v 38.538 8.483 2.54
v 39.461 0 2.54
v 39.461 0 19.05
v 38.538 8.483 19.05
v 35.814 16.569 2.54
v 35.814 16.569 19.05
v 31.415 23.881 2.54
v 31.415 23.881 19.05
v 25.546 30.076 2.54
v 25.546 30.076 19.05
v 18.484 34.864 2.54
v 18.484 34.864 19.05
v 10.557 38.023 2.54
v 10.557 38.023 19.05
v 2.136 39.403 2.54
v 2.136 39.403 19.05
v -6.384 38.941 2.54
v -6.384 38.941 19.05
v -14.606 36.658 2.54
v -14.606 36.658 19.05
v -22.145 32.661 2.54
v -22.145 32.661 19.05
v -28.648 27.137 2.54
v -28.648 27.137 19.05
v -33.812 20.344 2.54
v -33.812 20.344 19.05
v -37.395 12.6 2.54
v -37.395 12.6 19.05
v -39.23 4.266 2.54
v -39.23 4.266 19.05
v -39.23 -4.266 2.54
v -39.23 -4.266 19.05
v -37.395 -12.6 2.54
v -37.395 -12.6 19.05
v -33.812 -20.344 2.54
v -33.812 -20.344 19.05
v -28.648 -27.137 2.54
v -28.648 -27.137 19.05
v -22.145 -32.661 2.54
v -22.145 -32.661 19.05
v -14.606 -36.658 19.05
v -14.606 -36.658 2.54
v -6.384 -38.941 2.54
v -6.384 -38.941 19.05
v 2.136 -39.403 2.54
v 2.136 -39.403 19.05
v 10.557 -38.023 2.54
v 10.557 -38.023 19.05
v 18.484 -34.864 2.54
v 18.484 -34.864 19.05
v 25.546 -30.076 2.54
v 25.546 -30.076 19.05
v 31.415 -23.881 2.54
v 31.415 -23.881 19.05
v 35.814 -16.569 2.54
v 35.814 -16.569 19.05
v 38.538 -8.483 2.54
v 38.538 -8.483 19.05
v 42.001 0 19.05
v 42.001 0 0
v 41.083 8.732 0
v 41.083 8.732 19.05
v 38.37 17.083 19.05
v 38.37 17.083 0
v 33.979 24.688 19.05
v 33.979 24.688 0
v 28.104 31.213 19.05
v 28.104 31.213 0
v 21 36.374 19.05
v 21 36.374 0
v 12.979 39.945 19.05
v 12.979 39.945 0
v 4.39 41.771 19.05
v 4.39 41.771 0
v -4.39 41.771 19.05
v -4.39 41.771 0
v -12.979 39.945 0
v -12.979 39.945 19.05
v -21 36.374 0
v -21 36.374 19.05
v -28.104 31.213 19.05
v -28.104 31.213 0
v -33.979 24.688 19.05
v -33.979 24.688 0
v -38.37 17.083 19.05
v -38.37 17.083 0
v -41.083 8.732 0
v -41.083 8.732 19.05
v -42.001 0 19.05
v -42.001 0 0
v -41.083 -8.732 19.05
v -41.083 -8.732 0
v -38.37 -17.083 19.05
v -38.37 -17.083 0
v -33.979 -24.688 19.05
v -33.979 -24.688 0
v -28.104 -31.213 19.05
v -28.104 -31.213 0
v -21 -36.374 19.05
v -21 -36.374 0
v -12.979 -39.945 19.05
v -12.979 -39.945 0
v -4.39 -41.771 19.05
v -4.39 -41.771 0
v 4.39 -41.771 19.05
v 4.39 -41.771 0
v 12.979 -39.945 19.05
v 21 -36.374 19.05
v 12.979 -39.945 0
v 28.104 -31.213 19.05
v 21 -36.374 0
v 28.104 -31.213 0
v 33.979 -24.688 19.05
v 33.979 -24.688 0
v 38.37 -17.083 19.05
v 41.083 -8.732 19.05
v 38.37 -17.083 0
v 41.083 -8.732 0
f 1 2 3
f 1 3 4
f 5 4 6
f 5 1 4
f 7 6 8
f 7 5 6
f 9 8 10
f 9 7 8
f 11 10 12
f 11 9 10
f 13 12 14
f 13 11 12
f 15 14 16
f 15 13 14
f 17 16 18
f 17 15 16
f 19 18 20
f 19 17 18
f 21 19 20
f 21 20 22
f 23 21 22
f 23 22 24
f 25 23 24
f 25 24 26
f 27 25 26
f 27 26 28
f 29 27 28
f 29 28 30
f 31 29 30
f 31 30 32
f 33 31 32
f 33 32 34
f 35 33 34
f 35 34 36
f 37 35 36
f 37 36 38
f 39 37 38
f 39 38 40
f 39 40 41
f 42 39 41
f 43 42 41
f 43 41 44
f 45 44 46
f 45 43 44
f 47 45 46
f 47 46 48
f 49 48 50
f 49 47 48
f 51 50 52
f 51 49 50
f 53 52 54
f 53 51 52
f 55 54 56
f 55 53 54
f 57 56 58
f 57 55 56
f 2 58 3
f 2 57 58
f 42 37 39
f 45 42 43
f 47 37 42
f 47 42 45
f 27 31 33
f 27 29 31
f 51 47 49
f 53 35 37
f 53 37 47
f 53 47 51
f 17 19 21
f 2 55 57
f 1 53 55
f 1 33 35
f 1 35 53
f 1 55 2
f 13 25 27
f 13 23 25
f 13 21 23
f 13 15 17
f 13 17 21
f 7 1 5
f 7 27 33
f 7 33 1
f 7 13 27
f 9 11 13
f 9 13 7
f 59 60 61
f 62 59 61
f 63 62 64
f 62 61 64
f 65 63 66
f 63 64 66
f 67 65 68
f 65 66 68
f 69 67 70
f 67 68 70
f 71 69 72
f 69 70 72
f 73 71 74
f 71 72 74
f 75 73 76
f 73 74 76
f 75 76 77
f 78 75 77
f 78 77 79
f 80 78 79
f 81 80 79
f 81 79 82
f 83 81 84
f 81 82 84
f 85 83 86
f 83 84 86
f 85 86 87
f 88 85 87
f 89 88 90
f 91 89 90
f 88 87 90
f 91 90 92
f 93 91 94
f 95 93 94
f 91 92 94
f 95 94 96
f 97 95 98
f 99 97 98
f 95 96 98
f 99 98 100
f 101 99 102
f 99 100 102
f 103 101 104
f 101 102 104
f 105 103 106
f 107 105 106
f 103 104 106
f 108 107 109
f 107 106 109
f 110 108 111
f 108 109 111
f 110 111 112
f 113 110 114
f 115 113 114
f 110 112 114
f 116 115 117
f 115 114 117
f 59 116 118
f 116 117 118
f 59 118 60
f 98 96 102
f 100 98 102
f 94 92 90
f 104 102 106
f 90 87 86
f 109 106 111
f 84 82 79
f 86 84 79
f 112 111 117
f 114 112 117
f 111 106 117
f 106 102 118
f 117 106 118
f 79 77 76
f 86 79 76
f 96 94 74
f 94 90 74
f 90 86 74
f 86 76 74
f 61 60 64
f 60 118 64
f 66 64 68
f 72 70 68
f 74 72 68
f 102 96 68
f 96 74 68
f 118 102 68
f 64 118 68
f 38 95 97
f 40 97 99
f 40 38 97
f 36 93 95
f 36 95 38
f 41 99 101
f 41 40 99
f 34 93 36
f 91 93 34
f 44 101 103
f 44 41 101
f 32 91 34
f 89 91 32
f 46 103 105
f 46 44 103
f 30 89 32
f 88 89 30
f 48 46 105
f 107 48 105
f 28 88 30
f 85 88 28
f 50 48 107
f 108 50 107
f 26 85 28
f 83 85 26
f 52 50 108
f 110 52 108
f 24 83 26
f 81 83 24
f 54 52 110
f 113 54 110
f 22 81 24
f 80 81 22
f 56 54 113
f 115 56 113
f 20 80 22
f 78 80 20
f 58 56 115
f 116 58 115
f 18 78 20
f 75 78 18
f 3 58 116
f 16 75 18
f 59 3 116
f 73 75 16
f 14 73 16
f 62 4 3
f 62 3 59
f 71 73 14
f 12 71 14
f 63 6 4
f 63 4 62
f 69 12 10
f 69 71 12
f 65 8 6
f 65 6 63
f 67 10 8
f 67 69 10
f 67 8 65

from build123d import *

# Parameters (mm, degrees)
F0_R     = 42.000965
F1_DEPTH = 19.05
F2_DEPTH = 0.029528
F3_T     = -2.54


with BuildPart() as f1:
    # F0 (on Top) → F1 (new body)
    with BuildSketch(Plane.XY):
        Circle(F0_R)
    extrude(amount=F1_DEPTH)

    # F3
    f3_openings = [f1.faces().sort_by_distance(p)[0] for p in [
        (0, 0, 19.05),
    ]]
    offset(amount=F3_T, openings=f3_openings)


with BuildPart() as f2:
    # F0 (on Top) → F2 (new body)
    with BuildSketch(Plane.XY):
        Circle(F0_R)
    extrude(amount=F2_DEPTH)


solid = f1.part
